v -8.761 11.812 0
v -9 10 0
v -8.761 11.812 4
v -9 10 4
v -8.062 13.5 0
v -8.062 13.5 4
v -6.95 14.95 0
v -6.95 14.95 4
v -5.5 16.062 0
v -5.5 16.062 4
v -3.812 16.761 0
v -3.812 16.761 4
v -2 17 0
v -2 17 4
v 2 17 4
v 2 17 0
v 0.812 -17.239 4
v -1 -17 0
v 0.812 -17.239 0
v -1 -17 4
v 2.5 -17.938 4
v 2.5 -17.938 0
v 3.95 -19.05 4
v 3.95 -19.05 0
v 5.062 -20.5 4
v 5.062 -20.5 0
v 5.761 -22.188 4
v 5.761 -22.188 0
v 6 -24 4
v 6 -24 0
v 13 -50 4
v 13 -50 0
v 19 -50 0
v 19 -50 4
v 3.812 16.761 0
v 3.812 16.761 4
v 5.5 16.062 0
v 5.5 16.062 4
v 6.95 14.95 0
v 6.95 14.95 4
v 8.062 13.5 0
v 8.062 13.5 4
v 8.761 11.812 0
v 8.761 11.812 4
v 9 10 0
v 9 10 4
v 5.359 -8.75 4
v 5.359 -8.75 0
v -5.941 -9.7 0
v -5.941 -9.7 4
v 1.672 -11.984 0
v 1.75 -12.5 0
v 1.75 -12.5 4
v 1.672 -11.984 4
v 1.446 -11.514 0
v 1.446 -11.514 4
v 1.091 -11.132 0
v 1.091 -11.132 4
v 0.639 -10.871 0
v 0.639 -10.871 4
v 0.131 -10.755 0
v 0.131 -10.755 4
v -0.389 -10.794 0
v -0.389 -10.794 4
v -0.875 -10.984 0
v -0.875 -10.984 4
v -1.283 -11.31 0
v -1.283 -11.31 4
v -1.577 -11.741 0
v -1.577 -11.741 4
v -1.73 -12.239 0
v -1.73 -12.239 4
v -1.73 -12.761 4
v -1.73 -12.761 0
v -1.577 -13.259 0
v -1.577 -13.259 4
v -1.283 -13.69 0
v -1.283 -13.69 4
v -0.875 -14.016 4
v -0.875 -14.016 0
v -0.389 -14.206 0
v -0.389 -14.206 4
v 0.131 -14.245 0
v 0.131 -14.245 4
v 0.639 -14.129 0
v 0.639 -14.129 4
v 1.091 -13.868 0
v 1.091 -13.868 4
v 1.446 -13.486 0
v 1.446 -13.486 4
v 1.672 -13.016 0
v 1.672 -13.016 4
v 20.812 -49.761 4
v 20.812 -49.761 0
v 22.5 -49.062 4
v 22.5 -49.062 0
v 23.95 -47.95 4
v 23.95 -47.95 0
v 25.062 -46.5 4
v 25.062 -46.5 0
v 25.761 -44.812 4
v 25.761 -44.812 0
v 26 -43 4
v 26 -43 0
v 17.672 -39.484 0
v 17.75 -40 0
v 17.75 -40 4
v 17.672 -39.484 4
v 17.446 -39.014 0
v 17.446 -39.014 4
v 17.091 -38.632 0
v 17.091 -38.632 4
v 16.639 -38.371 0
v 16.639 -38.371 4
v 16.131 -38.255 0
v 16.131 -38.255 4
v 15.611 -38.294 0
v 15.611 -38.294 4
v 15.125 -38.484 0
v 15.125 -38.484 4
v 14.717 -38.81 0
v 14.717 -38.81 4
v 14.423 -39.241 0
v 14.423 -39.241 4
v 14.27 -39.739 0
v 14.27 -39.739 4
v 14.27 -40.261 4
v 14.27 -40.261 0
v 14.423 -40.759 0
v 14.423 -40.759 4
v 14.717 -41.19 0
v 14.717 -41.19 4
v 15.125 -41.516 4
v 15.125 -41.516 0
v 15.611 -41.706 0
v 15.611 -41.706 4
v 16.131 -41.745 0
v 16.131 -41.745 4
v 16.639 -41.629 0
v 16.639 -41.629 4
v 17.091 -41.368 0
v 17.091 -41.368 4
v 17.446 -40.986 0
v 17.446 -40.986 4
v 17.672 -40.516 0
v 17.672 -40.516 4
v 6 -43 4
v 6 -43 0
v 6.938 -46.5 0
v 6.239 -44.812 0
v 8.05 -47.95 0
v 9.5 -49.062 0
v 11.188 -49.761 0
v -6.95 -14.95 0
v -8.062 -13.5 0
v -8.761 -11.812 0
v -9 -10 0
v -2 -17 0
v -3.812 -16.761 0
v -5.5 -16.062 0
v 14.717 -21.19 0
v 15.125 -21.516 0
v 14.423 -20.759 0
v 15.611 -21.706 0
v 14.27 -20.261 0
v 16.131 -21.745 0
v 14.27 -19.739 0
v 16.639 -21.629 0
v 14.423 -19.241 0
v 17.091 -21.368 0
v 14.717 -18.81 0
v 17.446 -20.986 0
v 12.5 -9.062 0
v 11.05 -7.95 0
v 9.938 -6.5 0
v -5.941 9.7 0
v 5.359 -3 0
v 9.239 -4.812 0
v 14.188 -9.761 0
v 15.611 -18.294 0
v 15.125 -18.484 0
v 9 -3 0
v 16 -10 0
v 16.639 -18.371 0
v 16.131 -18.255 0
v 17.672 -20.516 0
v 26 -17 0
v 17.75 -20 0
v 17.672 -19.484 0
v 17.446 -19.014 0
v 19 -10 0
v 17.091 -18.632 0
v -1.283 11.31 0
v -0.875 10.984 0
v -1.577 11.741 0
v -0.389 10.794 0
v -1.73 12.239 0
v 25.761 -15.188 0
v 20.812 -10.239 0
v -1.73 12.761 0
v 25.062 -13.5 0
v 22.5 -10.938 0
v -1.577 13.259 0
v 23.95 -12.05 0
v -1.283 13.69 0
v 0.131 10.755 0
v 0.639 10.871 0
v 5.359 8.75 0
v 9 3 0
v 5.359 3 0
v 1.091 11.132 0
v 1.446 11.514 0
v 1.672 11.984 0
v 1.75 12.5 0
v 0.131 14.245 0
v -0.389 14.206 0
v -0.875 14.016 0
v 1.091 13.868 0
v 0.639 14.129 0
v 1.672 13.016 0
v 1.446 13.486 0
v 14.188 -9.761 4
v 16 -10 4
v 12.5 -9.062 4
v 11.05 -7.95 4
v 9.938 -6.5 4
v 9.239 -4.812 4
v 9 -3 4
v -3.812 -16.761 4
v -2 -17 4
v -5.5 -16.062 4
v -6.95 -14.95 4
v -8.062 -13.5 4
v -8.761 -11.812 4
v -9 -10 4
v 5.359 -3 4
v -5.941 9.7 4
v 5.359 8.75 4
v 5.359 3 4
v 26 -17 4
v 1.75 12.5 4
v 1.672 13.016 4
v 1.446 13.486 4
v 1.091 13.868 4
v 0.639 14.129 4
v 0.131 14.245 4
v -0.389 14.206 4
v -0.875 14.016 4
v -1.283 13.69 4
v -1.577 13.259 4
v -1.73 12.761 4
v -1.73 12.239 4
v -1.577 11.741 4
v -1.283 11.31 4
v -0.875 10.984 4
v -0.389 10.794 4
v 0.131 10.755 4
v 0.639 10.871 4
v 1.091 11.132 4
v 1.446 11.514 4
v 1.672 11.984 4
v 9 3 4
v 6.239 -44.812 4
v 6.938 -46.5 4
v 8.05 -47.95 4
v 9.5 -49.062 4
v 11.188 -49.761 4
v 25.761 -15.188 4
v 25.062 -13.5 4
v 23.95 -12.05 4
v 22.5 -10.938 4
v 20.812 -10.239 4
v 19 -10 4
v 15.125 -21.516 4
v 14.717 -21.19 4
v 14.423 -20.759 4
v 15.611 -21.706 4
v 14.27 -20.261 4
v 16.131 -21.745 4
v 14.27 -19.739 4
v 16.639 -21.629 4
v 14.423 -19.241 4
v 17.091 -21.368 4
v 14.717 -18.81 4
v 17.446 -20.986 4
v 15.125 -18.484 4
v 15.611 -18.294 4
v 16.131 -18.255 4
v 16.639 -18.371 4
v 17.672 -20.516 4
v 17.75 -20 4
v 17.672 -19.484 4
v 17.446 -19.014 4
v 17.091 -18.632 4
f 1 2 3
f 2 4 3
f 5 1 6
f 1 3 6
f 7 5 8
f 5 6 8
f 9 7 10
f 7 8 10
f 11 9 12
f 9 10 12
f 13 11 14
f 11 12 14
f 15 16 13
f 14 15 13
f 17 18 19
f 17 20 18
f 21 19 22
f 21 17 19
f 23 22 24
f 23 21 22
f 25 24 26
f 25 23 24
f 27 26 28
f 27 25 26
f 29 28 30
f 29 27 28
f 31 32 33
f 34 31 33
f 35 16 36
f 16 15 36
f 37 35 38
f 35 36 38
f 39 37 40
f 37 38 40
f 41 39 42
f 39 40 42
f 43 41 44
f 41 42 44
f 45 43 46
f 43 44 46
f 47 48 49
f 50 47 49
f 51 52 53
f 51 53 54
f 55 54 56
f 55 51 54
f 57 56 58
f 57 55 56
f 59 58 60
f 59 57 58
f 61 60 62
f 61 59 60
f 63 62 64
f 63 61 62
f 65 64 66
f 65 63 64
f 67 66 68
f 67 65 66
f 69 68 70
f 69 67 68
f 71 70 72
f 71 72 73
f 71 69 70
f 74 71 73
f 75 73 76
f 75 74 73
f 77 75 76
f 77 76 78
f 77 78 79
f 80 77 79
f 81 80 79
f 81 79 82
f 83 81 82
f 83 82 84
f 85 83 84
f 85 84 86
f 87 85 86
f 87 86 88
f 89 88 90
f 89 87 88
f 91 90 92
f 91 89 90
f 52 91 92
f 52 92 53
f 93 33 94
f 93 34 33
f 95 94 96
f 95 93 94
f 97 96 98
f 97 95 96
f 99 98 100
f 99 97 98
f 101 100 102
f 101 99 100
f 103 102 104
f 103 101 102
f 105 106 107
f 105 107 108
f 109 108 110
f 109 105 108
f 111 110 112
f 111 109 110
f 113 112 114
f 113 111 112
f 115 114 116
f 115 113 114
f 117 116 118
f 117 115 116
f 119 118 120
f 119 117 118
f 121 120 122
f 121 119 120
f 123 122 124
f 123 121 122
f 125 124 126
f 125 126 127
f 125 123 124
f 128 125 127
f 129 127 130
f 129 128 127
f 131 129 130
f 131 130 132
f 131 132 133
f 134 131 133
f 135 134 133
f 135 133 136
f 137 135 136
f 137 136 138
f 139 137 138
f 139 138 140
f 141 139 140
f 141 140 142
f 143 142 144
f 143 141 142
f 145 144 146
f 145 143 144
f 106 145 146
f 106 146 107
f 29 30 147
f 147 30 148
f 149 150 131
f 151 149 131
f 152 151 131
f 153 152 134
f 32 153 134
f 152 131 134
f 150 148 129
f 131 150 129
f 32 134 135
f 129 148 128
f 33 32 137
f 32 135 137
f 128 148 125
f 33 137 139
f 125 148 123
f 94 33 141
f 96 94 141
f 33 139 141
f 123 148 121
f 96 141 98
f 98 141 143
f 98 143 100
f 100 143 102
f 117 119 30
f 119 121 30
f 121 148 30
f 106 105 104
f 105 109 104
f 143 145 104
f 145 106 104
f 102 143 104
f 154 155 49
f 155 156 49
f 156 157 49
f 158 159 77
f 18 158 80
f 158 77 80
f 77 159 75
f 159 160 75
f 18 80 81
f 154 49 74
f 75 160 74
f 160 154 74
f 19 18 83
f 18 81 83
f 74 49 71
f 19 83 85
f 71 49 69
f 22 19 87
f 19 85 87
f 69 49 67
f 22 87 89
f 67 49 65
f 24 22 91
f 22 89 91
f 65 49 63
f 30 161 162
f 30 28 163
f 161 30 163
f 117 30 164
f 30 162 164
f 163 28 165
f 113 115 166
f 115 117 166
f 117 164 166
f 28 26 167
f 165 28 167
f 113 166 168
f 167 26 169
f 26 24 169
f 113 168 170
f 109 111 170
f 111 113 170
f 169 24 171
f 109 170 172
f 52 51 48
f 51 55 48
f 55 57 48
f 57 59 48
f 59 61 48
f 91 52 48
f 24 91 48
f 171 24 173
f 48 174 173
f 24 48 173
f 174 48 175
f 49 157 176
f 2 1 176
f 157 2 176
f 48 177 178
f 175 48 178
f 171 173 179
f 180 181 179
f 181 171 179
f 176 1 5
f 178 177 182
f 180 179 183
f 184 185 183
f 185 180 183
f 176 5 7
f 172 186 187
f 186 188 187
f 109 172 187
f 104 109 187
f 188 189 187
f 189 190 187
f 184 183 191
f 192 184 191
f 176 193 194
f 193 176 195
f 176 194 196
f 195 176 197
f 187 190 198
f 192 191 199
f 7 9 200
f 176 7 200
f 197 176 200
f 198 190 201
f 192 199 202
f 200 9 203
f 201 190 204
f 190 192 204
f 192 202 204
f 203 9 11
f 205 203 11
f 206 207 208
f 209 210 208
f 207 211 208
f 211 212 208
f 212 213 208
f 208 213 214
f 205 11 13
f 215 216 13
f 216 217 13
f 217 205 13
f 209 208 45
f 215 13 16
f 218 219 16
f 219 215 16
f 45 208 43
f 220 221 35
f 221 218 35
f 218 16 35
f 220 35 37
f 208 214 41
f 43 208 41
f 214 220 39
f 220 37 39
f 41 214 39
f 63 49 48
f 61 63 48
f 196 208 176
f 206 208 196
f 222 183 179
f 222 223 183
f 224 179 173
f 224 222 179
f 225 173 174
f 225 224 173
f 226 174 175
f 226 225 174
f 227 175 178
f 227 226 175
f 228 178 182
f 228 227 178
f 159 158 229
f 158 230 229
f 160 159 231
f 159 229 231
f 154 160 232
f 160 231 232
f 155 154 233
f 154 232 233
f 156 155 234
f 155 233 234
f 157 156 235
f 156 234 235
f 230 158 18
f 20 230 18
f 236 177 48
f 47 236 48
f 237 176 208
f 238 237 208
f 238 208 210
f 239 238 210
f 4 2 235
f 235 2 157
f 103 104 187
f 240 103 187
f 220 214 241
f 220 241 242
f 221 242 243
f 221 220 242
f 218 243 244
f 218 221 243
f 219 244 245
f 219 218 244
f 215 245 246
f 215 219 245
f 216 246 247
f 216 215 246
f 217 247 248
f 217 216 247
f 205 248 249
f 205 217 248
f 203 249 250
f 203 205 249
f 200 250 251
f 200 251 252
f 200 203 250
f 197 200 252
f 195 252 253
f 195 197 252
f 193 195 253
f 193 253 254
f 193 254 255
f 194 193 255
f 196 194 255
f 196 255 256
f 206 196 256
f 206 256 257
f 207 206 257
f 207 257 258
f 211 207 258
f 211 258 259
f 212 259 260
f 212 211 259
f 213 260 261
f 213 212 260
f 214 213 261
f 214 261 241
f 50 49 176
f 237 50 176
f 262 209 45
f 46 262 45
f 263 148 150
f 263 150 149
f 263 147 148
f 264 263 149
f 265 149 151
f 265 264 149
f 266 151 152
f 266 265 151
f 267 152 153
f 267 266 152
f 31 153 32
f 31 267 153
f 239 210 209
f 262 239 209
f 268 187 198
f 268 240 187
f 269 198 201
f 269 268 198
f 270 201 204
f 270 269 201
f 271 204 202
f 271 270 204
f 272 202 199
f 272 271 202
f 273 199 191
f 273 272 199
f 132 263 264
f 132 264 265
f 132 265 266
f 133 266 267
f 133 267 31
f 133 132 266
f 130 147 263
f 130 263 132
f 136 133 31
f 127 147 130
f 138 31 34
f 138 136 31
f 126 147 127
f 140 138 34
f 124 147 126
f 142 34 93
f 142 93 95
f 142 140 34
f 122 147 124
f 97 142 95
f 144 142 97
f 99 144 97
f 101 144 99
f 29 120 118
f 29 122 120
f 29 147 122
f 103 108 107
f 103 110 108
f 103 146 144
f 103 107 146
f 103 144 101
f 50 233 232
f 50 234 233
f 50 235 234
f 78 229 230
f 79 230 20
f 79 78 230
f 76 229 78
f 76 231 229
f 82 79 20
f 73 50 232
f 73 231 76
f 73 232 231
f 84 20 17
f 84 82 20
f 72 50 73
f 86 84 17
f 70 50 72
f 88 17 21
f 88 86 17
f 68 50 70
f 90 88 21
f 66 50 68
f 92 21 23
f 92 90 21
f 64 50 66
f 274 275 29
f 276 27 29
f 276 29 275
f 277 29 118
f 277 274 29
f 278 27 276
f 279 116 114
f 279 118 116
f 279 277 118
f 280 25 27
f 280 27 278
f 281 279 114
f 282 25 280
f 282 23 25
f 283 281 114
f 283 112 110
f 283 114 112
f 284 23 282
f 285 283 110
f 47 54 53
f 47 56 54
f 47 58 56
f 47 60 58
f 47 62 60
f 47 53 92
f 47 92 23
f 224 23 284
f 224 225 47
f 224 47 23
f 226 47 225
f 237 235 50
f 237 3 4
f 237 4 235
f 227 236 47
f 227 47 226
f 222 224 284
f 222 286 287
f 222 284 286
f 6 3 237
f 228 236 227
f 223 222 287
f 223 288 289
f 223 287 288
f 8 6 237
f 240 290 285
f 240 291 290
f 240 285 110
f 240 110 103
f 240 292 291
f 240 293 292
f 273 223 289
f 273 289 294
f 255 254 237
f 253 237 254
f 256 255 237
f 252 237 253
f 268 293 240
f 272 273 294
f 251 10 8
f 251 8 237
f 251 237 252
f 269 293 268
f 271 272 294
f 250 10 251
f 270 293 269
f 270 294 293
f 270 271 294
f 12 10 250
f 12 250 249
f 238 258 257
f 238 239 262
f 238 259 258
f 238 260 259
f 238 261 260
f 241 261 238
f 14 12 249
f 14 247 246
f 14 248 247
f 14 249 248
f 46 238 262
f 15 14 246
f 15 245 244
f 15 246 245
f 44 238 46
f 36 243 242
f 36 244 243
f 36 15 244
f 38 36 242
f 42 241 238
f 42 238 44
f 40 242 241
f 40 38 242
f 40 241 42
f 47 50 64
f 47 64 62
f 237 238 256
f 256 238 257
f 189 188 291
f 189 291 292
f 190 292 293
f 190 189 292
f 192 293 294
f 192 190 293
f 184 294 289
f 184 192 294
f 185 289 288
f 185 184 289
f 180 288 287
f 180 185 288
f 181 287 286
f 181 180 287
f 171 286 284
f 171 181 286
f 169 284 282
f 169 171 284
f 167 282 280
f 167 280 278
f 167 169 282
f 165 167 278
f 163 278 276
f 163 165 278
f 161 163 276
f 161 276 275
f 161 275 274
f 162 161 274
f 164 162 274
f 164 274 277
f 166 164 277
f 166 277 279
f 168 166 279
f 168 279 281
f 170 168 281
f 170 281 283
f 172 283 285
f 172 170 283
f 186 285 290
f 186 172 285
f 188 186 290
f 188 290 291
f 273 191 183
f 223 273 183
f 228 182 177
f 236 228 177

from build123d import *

# Parameters (mm, degrees)
ESBO_O1_R                = 1.75
RESSALTO_EXTRUS_O1_DEPTH = 4
FILETE2_R                = 7


with BuildPart() as part:
    # Esboço1 → Ressalto-extrusão1 (new body)
    with BuildSketch(Plane.XY):
        Polygon((-9, -17), (6, -17), (6, -50), (26, -50), (26, -10), (9, -10), (9, -3), (5.359078591, -3), (5.359078591, -8.75), (-5.940921409, -9.7), (-5.940921409, 9.7), (5.359078591, 8.75), (5.359078591, 3), (9, 3), (9, 17), (-9, 17), align=None)
        with Locations((16, -40)):
            Circle(ESBO_O1_R, mode=Mode.SUBTRACT)
        with Locations((16, -20)):
            Circle(ESBO_O1_R, mode=Mode.SUBTRACT)
        with Locations((0, -12.5)):
            Circle(ESBO_O1_R, mode=Mode.SUBTRACT)
        with Locations((0, 12.5)):
            Circle(ESBO_O1_R, mode=Mode.SUBTRACT)
    extrude(amount=RESSALTO_EXTRUS_O1_DEPTH)

    # Filete2
    filete2_edges = [part.edges().sort_by_distance(p)[0] for p in [
        (6, -50, 2),
        (6, -17, 2),
        (-9, -17, 2),
        (-9, 17, 2),
        (9, 17, 2),
        (9, -10, 2),
        (26, -10, 2),
        (26, -50, 2),
    ]]
    fillet(filete2_edges, radius=FILETE2_R - 0.0001)  # a hair under: the kernel refuses the full size


solid = part.part
